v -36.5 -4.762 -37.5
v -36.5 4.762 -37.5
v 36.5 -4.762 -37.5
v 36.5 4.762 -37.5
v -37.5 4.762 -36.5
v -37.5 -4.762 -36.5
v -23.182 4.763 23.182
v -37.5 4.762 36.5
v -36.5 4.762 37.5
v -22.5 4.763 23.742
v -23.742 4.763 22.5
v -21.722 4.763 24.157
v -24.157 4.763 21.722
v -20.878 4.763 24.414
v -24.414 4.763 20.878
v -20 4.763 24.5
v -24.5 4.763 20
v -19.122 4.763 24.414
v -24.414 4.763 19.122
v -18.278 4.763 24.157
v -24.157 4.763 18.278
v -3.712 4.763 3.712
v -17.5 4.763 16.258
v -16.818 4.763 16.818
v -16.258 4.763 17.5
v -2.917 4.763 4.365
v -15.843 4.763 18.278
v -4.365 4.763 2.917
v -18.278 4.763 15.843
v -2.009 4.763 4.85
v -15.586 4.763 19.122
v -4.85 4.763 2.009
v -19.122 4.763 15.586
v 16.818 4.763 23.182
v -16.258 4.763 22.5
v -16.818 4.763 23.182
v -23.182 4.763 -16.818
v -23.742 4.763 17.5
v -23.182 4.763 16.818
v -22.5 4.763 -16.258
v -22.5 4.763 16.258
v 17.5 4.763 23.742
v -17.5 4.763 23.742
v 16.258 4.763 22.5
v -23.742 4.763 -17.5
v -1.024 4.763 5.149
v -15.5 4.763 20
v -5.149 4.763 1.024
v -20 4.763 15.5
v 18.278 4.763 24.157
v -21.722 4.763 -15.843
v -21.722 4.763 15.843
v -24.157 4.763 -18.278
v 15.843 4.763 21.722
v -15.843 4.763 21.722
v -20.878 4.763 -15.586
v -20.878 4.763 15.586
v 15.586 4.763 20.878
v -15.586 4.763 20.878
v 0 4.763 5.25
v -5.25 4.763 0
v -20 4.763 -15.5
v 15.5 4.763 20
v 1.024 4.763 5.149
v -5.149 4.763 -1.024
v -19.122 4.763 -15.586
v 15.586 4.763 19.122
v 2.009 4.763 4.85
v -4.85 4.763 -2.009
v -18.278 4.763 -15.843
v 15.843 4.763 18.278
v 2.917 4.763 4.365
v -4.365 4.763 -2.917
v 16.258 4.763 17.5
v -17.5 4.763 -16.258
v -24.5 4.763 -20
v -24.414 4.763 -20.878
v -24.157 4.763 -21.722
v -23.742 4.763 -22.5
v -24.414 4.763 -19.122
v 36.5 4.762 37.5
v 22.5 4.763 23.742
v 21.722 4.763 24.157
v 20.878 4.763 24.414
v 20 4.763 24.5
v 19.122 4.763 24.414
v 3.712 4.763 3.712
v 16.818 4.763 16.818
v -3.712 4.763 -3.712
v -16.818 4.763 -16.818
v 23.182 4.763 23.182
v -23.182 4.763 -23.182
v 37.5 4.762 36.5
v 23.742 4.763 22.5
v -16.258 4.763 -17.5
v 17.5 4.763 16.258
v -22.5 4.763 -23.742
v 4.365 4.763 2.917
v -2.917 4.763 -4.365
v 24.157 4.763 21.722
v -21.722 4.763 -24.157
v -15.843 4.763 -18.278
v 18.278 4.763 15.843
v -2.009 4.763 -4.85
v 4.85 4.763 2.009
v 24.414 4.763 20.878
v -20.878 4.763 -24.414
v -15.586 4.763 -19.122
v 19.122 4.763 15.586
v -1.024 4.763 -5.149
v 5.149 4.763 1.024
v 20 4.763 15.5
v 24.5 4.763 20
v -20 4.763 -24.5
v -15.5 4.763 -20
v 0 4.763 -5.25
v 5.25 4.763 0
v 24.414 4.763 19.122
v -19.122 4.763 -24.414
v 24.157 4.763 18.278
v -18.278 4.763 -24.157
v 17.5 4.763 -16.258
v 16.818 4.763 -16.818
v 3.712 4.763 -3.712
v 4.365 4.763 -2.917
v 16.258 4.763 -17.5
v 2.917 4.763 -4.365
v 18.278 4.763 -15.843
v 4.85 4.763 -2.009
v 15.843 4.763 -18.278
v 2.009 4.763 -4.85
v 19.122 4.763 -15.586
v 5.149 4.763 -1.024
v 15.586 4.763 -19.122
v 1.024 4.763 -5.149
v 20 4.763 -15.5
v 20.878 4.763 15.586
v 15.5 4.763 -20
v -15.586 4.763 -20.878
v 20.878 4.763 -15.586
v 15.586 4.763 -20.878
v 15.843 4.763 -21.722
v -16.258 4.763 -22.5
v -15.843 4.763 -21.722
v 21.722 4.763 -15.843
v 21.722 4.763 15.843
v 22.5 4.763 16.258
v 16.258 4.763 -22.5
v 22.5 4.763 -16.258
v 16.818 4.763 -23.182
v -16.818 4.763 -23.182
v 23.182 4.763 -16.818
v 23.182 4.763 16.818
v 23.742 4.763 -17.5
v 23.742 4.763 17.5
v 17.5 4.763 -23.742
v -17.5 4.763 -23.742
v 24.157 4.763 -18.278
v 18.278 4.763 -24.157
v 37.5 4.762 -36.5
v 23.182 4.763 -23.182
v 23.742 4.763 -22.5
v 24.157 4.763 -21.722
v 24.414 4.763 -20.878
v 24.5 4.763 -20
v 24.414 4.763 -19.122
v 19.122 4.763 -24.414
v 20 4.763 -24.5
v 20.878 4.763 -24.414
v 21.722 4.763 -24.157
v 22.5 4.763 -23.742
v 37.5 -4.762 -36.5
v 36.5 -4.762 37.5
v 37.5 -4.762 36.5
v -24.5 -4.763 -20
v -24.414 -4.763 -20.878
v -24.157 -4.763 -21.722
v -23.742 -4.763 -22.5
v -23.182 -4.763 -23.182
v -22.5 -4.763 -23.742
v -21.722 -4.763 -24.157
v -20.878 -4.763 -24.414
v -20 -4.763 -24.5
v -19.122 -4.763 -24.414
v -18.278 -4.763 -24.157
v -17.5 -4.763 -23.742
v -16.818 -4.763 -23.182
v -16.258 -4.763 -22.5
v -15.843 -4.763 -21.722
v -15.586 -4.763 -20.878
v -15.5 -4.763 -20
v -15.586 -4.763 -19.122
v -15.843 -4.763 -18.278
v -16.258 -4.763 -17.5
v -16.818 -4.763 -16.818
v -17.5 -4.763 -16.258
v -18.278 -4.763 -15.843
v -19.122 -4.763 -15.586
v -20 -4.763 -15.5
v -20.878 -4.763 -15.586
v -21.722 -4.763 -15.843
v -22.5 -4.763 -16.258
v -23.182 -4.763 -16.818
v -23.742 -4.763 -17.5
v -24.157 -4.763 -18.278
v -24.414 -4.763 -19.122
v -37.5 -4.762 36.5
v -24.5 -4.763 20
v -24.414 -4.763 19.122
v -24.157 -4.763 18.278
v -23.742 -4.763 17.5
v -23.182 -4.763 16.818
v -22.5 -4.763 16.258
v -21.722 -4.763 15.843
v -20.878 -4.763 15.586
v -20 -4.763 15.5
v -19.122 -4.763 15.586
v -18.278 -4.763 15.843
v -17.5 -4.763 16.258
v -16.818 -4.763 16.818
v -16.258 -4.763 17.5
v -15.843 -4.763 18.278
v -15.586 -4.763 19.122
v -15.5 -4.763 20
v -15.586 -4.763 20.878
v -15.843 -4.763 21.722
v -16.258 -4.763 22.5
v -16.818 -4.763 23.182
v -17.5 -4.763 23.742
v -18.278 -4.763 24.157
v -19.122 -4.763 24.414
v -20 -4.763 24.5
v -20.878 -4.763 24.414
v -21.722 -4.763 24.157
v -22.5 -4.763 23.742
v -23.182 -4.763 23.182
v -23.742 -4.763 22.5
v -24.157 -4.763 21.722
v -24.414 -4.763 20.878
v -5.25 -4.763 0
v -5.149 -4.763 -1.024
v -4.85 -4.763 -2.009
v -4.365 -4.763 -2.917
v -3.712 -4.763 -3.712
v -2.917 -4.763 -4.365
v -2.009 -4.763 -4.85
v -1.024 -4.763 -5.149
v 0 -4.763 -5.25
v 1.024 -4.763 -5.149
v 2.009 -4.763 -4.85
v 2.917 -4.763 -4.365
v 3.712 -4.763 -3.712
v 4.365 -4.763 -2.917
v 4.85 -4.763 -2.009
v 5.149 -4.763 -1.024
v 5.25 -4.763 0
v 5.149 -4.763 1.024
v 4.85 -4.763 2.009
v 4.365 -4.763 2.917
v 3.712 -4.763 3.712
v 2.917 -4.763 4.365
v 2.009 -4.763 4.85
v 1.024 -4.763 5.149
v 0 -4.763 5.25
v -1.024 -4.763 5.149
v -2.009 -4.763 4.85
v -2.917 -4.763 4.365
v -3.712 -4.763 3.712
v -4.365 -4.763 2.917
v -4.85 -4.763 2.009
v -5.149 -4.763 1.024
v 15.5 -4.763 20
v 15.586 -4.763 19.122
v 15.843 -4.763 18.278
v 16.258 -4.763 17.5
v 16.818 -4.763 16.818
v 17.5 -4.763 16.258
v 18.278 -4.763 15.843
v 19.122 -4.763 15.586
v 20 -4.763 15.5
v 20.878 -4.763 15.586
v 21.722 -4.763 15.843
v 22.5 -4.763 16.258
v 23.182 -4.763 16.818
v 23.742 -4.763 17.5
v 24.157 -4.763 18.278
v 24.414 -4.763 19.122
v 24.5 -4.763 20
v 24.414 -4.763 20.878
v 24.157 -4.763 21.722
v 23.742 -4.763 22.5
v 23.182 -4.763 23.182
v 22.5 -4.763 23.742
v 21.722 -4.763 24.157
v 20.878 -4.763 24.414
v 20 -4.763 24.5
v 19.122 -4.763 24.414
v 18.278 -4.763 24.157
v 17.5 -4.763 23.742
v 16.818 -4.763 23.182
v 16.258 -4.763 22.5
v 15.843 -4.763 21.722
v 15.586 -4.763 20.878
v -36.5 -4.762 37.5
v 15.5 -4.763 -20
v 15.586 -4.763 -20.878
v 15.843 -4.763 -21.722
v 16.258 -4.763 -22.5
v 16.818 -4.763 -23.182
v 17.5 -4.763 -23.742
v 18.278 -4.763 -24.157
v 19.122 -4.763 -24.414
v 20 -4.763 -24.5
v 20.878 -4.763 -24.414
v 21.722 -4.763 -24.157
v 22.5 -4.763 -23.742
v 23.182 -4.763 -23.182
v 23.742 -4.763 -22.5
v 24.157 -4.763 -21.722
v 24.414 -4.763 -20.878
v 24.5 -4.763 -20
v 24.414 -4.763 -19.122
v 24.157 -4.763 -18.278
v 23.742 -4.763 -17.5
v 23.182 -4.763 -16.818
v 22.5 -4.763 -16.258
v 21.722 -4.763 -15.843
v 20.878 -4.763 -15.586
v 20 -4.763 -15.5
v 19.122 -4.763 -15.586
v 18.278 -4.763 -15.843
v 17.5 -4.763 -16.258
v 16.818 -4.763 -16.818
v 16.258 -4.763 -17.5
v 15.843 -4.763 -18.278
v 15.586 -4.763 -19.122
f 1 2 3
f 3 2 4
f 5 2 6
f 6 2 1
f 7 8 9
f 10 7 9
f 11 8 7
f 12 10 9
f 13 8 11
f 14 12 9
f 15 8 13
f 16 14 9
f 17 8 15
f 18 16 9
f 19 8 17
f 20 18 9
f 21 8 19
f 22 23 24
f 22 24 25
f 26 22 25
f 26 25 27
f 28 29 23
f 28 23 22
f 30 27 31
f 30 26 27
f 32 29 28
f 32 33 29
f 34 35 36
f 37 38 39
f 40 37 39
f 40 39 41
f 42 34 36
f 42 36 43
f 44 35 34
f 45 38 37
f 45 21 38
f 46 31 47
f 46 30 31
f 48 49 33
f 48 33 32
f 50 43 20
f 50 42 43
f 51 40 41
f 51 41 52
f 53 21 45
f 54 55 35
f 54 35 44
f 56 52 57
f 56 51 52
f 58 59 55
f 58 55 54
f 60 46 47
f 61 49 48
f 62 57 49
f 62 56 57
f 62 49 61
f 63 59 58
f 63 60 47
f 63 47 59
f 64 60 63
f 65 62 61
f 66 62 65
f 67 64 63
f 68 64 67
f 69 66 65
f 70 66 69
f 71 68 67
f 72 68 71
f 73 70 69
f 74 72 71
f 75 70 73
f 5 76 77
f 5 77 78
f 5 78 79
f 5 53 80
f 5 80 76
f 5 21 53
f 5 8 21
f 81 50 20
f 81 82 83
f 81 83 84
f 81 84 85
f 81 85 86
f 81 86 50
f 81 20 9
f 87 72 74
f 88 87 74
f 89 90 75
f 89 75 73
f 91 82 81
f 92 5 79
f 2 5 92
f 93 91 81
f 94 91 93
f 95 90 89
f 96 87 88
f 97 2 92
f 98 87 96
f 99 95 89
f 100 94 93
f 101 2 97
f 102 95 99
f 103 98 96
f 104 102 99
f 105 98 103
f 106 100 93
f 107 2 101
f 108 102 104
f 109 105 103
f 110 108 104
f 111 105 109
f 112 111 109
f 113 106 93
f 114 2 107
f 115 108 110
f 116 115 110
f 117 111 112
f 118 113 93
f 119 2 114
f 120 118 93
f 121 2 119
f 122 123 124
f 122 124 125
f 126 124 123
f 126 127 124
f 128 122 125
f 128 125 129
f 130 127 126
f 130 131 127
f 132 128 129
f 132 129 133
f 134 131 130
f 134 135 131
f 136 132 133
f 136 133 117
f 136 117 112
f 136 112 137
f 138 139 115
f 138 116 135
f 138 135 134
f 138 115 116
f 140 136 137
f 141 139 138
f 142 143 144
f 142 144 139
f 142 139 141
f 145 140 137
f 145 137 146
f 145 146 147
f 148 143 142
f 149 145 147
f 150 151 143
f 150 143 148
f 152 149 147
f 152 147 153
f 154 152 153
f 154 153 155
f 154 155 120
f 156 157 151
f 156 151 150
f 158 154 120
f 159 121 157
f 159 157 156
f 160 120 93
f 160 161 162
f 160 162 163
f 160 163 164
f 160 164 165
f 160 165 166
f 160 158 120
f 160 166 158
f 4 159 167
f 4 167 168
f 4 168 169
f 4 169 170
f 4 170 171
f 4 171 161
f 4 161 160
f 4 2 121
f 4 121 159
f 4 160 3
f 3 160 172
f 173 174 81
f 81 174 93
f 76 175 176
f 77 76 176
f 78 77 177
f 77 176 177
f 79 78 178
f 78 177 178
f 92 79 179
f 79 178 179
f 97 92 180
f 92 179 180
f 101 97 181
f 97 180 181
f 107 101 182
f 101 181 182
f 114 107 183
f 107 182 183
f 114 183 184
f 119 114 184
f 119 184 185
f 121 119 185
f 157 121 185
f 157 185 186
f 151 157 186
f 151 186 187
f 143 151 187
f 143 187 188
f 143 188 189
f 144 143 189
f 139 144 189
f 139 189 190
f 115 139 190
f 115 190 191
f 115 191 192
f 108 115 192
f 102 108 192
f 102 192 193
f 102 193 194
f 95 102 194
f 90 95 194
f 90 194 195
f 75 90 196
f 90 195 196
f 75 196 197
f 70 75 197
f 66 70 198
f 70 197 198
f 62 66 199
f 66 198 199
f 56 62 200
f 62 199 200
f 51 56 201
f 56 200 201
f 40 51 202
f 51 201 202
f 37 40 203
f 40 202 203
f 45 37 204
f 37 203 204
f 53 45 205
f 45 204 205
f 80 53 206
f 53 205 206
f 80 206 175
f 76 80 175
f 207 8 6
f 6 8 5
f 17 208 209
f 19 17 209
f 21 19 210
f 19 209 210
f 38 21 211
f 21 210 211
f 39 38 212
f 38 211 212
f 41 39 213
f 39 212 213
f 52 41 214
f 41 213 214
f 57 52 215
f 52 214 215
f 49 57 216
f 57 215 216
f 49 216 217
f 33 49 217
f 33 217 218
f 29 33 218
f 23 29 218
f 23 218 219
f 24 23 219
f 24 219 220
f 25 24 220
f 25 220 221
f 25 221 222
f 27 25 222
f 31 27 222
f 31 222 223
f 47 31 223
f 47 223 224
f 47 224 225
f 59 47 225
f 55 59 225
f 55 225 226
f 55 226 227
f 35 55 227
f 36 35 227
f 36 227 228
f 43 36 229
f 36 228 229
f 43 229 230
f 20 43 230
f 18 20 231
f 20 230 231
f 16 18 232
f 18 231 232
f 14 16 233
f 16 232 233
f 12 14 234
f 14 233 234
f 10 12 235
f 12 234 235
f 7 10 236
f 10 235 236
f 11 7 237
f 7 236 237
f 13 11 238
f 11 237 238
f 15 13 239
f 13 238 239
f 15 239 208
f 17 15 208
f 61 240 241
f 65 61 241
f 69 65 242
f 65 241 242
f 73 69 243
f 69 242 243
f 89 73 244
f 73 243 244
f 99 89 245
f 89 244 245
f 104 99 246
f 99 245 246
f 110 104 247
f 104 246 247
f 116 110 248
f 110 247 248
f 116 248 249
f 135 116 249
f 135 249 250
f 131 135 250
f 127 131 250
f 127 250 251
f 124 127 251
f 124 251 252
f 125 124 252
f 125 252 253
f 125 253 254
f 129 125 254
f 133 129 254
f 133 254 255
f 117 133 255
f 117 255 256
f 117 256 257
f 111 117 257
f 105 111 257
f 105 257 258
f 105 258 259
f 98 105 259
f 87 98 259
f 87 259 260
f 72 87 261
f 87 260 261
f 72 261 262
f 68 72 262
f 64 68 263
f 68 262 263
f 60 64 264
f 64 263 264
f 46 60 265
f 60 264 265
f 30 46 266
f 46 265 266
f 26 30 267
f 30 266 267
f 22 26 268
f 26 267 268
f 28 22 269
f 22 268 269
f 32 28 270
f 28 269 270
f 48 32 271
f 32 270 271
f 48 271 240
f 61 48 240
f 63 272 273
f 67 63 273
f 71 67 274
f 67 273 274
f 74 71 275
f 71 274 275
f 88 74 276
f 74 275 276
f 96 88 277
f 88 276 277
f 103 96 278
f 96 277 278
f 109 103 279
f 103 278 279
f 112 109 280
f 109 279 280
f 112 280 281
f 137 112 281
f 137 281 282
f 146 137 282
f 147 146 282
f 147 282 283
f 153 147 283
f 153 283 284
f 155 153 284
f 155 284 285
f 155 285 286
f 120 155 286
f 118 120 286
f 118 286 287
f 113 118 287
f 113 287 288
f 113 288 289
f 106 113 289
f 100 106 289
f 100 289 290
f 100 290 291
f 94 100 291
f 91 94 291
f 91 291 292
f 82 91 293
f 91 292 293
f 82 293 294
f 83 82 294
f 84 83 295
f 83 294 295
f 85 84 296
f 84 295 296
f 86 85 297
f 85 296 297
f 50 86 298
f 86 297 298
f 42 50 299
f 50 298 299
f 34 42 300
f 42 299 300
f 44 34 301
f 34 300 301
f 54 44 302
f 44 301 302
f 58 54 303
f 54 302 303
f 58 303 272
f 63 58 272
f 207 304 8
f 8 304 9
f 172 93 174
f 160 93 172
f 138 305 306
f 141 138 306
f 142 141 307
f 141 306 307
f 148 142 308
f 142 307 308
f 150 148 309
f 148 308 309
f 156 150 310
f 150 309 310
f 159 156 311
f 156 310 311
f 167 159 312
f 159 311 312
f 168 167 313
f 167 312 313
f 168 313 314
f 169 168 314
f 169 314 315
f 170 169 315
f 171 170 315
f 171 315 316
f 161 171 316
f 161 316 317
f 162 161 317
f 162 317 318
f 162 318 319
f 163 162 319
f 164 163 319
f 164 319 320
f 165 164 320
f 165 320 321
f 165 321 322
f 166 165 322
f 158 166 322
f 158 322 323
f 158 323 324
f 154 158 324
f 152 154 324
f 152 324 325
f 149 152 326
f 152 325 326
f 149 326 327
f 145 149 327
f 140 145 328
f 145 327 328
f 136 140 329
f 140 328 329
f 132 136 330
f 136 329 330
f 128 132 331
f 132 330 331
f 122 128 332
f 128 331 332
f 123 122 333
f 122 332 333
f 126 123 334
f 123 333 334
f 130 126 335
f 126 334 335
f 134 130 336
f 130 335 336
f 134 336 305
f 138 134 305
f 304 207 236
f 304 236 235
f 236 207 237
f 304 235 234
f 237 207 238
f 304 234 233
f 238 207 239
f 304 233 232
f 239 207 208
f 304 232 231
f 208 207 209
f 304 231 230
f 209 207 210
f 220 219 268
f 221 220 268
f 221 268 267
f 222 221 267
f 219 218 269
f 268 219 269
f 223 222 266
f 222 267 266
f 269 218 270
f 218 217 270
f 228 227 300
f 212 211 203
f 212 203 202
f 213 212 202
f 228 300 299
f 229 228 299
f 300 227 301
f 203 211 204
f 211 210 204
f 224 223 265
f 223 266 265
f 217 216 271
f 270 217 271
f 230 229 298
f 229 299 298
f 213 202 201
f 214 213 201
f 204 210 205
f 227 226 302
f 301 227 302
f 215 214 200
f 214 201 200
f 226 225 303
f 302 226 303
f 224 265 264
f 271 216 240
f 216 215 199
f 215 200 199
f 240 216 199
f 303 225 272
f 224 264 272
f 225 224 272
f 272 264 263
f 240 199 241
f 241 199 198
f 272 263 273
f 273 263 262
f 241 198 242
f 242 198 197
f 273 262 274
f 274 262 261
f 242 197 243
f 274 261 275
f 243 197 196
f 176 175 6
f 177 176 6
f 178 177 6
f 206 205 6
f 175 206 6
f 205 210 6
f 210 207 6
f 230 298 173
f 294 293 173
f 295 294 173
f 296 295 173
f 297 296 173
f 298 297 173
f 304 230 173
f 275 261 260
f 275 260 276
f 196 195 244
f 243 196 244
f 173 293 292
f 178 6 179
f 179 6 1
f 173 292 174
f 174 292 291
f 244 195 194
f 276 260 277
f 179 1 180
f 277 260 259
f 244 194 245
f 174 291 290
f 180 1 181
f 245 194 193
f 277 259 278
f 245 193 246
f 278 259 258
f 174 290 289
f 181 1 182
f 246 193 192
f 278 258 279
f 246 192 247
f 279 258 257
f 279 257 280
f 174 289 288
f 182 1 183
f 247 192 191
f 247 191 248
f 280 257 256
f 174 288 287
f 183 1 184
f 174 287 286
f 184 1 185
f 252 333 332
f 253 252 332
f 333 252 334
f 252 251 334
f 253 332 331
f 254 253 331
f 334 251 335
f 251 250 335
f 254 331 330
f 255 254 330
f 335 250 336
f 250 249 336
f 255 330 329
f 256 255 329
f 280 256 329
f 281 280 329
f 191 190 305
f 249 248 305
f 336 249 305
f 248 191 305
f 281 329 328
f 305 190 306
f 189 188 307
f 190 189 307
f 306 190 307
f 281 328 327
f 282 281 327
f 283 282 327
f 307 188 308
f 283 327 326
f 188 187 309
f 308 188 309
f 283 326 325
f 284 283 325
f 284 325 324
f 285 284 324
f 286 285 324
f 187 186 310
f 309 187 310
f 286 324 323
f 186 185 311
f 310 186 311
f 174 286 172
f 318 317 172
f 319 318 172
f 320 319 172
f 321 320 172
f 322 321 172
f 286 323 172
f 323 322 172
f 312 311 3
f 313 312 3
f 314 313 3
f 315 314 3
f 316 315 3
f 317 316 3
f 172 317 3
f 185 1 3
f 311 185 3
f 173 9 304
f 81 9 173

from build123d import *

# Parameters (mm, degrees)
SKETCH1_W              = 75
SKETCH1_H              = 75
BOSS_EXTRUDE1_DEPTH    = 4.7625
M8_CLEARANCE_HOLE1_D   = 9
M12X1_5_TAPPED_HOLE1_D = 10.5
CHAMFER1_SIZE          = 1


with BuildPart() as part:
    # Sketch1 → Boss-Extrude1 (new, symmetric)
    with BuildSketch(Plane(origin=(0, 0, 0), x_dir=(1, 0, 0), z_dir=(0, 1, 0))):
        Rectangle(SKETCH1_W, SKETCH1_H)
    extrude(amount=BOSS_EXTRUDE1_DEPTH, both=True)

    # M8 Clearance Hole1 (through all)
    with Locations(Plane(origin=(0, 4.7625, 0), x_dir=(1, 0, 0), z_dir=(0, 1, 0))):
        with Locations((-20, 20), (20, 20), (-20, -20), (20, -20)):
            Hole(M8_CLEARANCE_HOLE1_D / 2)

    # M12x1.5 Tapped Hole1 (through all)
    with Locations(Plane(origin=(0, 4.7625, 0), x_dir=(1, 0, 0), z_dir=(0, 1, 0))):
        with Locations((0, 0)):
            Hole(M12X1_5_TAPPED_HOLE1_D / 2)

    # Chamfer1
    chamfer1_edges = [part.edges().sort_by_distance(p)[0] for p in [
        (37.5, 0, 37.5),
        (-37.5, 0, 37.5),
        (-37.5, 0, -37.5),
        (37.5, 0, -37.5),
    ]]
    chamfer(chamfer1_edges, length=CHAMFER1_SIZE)


solid = part.part
